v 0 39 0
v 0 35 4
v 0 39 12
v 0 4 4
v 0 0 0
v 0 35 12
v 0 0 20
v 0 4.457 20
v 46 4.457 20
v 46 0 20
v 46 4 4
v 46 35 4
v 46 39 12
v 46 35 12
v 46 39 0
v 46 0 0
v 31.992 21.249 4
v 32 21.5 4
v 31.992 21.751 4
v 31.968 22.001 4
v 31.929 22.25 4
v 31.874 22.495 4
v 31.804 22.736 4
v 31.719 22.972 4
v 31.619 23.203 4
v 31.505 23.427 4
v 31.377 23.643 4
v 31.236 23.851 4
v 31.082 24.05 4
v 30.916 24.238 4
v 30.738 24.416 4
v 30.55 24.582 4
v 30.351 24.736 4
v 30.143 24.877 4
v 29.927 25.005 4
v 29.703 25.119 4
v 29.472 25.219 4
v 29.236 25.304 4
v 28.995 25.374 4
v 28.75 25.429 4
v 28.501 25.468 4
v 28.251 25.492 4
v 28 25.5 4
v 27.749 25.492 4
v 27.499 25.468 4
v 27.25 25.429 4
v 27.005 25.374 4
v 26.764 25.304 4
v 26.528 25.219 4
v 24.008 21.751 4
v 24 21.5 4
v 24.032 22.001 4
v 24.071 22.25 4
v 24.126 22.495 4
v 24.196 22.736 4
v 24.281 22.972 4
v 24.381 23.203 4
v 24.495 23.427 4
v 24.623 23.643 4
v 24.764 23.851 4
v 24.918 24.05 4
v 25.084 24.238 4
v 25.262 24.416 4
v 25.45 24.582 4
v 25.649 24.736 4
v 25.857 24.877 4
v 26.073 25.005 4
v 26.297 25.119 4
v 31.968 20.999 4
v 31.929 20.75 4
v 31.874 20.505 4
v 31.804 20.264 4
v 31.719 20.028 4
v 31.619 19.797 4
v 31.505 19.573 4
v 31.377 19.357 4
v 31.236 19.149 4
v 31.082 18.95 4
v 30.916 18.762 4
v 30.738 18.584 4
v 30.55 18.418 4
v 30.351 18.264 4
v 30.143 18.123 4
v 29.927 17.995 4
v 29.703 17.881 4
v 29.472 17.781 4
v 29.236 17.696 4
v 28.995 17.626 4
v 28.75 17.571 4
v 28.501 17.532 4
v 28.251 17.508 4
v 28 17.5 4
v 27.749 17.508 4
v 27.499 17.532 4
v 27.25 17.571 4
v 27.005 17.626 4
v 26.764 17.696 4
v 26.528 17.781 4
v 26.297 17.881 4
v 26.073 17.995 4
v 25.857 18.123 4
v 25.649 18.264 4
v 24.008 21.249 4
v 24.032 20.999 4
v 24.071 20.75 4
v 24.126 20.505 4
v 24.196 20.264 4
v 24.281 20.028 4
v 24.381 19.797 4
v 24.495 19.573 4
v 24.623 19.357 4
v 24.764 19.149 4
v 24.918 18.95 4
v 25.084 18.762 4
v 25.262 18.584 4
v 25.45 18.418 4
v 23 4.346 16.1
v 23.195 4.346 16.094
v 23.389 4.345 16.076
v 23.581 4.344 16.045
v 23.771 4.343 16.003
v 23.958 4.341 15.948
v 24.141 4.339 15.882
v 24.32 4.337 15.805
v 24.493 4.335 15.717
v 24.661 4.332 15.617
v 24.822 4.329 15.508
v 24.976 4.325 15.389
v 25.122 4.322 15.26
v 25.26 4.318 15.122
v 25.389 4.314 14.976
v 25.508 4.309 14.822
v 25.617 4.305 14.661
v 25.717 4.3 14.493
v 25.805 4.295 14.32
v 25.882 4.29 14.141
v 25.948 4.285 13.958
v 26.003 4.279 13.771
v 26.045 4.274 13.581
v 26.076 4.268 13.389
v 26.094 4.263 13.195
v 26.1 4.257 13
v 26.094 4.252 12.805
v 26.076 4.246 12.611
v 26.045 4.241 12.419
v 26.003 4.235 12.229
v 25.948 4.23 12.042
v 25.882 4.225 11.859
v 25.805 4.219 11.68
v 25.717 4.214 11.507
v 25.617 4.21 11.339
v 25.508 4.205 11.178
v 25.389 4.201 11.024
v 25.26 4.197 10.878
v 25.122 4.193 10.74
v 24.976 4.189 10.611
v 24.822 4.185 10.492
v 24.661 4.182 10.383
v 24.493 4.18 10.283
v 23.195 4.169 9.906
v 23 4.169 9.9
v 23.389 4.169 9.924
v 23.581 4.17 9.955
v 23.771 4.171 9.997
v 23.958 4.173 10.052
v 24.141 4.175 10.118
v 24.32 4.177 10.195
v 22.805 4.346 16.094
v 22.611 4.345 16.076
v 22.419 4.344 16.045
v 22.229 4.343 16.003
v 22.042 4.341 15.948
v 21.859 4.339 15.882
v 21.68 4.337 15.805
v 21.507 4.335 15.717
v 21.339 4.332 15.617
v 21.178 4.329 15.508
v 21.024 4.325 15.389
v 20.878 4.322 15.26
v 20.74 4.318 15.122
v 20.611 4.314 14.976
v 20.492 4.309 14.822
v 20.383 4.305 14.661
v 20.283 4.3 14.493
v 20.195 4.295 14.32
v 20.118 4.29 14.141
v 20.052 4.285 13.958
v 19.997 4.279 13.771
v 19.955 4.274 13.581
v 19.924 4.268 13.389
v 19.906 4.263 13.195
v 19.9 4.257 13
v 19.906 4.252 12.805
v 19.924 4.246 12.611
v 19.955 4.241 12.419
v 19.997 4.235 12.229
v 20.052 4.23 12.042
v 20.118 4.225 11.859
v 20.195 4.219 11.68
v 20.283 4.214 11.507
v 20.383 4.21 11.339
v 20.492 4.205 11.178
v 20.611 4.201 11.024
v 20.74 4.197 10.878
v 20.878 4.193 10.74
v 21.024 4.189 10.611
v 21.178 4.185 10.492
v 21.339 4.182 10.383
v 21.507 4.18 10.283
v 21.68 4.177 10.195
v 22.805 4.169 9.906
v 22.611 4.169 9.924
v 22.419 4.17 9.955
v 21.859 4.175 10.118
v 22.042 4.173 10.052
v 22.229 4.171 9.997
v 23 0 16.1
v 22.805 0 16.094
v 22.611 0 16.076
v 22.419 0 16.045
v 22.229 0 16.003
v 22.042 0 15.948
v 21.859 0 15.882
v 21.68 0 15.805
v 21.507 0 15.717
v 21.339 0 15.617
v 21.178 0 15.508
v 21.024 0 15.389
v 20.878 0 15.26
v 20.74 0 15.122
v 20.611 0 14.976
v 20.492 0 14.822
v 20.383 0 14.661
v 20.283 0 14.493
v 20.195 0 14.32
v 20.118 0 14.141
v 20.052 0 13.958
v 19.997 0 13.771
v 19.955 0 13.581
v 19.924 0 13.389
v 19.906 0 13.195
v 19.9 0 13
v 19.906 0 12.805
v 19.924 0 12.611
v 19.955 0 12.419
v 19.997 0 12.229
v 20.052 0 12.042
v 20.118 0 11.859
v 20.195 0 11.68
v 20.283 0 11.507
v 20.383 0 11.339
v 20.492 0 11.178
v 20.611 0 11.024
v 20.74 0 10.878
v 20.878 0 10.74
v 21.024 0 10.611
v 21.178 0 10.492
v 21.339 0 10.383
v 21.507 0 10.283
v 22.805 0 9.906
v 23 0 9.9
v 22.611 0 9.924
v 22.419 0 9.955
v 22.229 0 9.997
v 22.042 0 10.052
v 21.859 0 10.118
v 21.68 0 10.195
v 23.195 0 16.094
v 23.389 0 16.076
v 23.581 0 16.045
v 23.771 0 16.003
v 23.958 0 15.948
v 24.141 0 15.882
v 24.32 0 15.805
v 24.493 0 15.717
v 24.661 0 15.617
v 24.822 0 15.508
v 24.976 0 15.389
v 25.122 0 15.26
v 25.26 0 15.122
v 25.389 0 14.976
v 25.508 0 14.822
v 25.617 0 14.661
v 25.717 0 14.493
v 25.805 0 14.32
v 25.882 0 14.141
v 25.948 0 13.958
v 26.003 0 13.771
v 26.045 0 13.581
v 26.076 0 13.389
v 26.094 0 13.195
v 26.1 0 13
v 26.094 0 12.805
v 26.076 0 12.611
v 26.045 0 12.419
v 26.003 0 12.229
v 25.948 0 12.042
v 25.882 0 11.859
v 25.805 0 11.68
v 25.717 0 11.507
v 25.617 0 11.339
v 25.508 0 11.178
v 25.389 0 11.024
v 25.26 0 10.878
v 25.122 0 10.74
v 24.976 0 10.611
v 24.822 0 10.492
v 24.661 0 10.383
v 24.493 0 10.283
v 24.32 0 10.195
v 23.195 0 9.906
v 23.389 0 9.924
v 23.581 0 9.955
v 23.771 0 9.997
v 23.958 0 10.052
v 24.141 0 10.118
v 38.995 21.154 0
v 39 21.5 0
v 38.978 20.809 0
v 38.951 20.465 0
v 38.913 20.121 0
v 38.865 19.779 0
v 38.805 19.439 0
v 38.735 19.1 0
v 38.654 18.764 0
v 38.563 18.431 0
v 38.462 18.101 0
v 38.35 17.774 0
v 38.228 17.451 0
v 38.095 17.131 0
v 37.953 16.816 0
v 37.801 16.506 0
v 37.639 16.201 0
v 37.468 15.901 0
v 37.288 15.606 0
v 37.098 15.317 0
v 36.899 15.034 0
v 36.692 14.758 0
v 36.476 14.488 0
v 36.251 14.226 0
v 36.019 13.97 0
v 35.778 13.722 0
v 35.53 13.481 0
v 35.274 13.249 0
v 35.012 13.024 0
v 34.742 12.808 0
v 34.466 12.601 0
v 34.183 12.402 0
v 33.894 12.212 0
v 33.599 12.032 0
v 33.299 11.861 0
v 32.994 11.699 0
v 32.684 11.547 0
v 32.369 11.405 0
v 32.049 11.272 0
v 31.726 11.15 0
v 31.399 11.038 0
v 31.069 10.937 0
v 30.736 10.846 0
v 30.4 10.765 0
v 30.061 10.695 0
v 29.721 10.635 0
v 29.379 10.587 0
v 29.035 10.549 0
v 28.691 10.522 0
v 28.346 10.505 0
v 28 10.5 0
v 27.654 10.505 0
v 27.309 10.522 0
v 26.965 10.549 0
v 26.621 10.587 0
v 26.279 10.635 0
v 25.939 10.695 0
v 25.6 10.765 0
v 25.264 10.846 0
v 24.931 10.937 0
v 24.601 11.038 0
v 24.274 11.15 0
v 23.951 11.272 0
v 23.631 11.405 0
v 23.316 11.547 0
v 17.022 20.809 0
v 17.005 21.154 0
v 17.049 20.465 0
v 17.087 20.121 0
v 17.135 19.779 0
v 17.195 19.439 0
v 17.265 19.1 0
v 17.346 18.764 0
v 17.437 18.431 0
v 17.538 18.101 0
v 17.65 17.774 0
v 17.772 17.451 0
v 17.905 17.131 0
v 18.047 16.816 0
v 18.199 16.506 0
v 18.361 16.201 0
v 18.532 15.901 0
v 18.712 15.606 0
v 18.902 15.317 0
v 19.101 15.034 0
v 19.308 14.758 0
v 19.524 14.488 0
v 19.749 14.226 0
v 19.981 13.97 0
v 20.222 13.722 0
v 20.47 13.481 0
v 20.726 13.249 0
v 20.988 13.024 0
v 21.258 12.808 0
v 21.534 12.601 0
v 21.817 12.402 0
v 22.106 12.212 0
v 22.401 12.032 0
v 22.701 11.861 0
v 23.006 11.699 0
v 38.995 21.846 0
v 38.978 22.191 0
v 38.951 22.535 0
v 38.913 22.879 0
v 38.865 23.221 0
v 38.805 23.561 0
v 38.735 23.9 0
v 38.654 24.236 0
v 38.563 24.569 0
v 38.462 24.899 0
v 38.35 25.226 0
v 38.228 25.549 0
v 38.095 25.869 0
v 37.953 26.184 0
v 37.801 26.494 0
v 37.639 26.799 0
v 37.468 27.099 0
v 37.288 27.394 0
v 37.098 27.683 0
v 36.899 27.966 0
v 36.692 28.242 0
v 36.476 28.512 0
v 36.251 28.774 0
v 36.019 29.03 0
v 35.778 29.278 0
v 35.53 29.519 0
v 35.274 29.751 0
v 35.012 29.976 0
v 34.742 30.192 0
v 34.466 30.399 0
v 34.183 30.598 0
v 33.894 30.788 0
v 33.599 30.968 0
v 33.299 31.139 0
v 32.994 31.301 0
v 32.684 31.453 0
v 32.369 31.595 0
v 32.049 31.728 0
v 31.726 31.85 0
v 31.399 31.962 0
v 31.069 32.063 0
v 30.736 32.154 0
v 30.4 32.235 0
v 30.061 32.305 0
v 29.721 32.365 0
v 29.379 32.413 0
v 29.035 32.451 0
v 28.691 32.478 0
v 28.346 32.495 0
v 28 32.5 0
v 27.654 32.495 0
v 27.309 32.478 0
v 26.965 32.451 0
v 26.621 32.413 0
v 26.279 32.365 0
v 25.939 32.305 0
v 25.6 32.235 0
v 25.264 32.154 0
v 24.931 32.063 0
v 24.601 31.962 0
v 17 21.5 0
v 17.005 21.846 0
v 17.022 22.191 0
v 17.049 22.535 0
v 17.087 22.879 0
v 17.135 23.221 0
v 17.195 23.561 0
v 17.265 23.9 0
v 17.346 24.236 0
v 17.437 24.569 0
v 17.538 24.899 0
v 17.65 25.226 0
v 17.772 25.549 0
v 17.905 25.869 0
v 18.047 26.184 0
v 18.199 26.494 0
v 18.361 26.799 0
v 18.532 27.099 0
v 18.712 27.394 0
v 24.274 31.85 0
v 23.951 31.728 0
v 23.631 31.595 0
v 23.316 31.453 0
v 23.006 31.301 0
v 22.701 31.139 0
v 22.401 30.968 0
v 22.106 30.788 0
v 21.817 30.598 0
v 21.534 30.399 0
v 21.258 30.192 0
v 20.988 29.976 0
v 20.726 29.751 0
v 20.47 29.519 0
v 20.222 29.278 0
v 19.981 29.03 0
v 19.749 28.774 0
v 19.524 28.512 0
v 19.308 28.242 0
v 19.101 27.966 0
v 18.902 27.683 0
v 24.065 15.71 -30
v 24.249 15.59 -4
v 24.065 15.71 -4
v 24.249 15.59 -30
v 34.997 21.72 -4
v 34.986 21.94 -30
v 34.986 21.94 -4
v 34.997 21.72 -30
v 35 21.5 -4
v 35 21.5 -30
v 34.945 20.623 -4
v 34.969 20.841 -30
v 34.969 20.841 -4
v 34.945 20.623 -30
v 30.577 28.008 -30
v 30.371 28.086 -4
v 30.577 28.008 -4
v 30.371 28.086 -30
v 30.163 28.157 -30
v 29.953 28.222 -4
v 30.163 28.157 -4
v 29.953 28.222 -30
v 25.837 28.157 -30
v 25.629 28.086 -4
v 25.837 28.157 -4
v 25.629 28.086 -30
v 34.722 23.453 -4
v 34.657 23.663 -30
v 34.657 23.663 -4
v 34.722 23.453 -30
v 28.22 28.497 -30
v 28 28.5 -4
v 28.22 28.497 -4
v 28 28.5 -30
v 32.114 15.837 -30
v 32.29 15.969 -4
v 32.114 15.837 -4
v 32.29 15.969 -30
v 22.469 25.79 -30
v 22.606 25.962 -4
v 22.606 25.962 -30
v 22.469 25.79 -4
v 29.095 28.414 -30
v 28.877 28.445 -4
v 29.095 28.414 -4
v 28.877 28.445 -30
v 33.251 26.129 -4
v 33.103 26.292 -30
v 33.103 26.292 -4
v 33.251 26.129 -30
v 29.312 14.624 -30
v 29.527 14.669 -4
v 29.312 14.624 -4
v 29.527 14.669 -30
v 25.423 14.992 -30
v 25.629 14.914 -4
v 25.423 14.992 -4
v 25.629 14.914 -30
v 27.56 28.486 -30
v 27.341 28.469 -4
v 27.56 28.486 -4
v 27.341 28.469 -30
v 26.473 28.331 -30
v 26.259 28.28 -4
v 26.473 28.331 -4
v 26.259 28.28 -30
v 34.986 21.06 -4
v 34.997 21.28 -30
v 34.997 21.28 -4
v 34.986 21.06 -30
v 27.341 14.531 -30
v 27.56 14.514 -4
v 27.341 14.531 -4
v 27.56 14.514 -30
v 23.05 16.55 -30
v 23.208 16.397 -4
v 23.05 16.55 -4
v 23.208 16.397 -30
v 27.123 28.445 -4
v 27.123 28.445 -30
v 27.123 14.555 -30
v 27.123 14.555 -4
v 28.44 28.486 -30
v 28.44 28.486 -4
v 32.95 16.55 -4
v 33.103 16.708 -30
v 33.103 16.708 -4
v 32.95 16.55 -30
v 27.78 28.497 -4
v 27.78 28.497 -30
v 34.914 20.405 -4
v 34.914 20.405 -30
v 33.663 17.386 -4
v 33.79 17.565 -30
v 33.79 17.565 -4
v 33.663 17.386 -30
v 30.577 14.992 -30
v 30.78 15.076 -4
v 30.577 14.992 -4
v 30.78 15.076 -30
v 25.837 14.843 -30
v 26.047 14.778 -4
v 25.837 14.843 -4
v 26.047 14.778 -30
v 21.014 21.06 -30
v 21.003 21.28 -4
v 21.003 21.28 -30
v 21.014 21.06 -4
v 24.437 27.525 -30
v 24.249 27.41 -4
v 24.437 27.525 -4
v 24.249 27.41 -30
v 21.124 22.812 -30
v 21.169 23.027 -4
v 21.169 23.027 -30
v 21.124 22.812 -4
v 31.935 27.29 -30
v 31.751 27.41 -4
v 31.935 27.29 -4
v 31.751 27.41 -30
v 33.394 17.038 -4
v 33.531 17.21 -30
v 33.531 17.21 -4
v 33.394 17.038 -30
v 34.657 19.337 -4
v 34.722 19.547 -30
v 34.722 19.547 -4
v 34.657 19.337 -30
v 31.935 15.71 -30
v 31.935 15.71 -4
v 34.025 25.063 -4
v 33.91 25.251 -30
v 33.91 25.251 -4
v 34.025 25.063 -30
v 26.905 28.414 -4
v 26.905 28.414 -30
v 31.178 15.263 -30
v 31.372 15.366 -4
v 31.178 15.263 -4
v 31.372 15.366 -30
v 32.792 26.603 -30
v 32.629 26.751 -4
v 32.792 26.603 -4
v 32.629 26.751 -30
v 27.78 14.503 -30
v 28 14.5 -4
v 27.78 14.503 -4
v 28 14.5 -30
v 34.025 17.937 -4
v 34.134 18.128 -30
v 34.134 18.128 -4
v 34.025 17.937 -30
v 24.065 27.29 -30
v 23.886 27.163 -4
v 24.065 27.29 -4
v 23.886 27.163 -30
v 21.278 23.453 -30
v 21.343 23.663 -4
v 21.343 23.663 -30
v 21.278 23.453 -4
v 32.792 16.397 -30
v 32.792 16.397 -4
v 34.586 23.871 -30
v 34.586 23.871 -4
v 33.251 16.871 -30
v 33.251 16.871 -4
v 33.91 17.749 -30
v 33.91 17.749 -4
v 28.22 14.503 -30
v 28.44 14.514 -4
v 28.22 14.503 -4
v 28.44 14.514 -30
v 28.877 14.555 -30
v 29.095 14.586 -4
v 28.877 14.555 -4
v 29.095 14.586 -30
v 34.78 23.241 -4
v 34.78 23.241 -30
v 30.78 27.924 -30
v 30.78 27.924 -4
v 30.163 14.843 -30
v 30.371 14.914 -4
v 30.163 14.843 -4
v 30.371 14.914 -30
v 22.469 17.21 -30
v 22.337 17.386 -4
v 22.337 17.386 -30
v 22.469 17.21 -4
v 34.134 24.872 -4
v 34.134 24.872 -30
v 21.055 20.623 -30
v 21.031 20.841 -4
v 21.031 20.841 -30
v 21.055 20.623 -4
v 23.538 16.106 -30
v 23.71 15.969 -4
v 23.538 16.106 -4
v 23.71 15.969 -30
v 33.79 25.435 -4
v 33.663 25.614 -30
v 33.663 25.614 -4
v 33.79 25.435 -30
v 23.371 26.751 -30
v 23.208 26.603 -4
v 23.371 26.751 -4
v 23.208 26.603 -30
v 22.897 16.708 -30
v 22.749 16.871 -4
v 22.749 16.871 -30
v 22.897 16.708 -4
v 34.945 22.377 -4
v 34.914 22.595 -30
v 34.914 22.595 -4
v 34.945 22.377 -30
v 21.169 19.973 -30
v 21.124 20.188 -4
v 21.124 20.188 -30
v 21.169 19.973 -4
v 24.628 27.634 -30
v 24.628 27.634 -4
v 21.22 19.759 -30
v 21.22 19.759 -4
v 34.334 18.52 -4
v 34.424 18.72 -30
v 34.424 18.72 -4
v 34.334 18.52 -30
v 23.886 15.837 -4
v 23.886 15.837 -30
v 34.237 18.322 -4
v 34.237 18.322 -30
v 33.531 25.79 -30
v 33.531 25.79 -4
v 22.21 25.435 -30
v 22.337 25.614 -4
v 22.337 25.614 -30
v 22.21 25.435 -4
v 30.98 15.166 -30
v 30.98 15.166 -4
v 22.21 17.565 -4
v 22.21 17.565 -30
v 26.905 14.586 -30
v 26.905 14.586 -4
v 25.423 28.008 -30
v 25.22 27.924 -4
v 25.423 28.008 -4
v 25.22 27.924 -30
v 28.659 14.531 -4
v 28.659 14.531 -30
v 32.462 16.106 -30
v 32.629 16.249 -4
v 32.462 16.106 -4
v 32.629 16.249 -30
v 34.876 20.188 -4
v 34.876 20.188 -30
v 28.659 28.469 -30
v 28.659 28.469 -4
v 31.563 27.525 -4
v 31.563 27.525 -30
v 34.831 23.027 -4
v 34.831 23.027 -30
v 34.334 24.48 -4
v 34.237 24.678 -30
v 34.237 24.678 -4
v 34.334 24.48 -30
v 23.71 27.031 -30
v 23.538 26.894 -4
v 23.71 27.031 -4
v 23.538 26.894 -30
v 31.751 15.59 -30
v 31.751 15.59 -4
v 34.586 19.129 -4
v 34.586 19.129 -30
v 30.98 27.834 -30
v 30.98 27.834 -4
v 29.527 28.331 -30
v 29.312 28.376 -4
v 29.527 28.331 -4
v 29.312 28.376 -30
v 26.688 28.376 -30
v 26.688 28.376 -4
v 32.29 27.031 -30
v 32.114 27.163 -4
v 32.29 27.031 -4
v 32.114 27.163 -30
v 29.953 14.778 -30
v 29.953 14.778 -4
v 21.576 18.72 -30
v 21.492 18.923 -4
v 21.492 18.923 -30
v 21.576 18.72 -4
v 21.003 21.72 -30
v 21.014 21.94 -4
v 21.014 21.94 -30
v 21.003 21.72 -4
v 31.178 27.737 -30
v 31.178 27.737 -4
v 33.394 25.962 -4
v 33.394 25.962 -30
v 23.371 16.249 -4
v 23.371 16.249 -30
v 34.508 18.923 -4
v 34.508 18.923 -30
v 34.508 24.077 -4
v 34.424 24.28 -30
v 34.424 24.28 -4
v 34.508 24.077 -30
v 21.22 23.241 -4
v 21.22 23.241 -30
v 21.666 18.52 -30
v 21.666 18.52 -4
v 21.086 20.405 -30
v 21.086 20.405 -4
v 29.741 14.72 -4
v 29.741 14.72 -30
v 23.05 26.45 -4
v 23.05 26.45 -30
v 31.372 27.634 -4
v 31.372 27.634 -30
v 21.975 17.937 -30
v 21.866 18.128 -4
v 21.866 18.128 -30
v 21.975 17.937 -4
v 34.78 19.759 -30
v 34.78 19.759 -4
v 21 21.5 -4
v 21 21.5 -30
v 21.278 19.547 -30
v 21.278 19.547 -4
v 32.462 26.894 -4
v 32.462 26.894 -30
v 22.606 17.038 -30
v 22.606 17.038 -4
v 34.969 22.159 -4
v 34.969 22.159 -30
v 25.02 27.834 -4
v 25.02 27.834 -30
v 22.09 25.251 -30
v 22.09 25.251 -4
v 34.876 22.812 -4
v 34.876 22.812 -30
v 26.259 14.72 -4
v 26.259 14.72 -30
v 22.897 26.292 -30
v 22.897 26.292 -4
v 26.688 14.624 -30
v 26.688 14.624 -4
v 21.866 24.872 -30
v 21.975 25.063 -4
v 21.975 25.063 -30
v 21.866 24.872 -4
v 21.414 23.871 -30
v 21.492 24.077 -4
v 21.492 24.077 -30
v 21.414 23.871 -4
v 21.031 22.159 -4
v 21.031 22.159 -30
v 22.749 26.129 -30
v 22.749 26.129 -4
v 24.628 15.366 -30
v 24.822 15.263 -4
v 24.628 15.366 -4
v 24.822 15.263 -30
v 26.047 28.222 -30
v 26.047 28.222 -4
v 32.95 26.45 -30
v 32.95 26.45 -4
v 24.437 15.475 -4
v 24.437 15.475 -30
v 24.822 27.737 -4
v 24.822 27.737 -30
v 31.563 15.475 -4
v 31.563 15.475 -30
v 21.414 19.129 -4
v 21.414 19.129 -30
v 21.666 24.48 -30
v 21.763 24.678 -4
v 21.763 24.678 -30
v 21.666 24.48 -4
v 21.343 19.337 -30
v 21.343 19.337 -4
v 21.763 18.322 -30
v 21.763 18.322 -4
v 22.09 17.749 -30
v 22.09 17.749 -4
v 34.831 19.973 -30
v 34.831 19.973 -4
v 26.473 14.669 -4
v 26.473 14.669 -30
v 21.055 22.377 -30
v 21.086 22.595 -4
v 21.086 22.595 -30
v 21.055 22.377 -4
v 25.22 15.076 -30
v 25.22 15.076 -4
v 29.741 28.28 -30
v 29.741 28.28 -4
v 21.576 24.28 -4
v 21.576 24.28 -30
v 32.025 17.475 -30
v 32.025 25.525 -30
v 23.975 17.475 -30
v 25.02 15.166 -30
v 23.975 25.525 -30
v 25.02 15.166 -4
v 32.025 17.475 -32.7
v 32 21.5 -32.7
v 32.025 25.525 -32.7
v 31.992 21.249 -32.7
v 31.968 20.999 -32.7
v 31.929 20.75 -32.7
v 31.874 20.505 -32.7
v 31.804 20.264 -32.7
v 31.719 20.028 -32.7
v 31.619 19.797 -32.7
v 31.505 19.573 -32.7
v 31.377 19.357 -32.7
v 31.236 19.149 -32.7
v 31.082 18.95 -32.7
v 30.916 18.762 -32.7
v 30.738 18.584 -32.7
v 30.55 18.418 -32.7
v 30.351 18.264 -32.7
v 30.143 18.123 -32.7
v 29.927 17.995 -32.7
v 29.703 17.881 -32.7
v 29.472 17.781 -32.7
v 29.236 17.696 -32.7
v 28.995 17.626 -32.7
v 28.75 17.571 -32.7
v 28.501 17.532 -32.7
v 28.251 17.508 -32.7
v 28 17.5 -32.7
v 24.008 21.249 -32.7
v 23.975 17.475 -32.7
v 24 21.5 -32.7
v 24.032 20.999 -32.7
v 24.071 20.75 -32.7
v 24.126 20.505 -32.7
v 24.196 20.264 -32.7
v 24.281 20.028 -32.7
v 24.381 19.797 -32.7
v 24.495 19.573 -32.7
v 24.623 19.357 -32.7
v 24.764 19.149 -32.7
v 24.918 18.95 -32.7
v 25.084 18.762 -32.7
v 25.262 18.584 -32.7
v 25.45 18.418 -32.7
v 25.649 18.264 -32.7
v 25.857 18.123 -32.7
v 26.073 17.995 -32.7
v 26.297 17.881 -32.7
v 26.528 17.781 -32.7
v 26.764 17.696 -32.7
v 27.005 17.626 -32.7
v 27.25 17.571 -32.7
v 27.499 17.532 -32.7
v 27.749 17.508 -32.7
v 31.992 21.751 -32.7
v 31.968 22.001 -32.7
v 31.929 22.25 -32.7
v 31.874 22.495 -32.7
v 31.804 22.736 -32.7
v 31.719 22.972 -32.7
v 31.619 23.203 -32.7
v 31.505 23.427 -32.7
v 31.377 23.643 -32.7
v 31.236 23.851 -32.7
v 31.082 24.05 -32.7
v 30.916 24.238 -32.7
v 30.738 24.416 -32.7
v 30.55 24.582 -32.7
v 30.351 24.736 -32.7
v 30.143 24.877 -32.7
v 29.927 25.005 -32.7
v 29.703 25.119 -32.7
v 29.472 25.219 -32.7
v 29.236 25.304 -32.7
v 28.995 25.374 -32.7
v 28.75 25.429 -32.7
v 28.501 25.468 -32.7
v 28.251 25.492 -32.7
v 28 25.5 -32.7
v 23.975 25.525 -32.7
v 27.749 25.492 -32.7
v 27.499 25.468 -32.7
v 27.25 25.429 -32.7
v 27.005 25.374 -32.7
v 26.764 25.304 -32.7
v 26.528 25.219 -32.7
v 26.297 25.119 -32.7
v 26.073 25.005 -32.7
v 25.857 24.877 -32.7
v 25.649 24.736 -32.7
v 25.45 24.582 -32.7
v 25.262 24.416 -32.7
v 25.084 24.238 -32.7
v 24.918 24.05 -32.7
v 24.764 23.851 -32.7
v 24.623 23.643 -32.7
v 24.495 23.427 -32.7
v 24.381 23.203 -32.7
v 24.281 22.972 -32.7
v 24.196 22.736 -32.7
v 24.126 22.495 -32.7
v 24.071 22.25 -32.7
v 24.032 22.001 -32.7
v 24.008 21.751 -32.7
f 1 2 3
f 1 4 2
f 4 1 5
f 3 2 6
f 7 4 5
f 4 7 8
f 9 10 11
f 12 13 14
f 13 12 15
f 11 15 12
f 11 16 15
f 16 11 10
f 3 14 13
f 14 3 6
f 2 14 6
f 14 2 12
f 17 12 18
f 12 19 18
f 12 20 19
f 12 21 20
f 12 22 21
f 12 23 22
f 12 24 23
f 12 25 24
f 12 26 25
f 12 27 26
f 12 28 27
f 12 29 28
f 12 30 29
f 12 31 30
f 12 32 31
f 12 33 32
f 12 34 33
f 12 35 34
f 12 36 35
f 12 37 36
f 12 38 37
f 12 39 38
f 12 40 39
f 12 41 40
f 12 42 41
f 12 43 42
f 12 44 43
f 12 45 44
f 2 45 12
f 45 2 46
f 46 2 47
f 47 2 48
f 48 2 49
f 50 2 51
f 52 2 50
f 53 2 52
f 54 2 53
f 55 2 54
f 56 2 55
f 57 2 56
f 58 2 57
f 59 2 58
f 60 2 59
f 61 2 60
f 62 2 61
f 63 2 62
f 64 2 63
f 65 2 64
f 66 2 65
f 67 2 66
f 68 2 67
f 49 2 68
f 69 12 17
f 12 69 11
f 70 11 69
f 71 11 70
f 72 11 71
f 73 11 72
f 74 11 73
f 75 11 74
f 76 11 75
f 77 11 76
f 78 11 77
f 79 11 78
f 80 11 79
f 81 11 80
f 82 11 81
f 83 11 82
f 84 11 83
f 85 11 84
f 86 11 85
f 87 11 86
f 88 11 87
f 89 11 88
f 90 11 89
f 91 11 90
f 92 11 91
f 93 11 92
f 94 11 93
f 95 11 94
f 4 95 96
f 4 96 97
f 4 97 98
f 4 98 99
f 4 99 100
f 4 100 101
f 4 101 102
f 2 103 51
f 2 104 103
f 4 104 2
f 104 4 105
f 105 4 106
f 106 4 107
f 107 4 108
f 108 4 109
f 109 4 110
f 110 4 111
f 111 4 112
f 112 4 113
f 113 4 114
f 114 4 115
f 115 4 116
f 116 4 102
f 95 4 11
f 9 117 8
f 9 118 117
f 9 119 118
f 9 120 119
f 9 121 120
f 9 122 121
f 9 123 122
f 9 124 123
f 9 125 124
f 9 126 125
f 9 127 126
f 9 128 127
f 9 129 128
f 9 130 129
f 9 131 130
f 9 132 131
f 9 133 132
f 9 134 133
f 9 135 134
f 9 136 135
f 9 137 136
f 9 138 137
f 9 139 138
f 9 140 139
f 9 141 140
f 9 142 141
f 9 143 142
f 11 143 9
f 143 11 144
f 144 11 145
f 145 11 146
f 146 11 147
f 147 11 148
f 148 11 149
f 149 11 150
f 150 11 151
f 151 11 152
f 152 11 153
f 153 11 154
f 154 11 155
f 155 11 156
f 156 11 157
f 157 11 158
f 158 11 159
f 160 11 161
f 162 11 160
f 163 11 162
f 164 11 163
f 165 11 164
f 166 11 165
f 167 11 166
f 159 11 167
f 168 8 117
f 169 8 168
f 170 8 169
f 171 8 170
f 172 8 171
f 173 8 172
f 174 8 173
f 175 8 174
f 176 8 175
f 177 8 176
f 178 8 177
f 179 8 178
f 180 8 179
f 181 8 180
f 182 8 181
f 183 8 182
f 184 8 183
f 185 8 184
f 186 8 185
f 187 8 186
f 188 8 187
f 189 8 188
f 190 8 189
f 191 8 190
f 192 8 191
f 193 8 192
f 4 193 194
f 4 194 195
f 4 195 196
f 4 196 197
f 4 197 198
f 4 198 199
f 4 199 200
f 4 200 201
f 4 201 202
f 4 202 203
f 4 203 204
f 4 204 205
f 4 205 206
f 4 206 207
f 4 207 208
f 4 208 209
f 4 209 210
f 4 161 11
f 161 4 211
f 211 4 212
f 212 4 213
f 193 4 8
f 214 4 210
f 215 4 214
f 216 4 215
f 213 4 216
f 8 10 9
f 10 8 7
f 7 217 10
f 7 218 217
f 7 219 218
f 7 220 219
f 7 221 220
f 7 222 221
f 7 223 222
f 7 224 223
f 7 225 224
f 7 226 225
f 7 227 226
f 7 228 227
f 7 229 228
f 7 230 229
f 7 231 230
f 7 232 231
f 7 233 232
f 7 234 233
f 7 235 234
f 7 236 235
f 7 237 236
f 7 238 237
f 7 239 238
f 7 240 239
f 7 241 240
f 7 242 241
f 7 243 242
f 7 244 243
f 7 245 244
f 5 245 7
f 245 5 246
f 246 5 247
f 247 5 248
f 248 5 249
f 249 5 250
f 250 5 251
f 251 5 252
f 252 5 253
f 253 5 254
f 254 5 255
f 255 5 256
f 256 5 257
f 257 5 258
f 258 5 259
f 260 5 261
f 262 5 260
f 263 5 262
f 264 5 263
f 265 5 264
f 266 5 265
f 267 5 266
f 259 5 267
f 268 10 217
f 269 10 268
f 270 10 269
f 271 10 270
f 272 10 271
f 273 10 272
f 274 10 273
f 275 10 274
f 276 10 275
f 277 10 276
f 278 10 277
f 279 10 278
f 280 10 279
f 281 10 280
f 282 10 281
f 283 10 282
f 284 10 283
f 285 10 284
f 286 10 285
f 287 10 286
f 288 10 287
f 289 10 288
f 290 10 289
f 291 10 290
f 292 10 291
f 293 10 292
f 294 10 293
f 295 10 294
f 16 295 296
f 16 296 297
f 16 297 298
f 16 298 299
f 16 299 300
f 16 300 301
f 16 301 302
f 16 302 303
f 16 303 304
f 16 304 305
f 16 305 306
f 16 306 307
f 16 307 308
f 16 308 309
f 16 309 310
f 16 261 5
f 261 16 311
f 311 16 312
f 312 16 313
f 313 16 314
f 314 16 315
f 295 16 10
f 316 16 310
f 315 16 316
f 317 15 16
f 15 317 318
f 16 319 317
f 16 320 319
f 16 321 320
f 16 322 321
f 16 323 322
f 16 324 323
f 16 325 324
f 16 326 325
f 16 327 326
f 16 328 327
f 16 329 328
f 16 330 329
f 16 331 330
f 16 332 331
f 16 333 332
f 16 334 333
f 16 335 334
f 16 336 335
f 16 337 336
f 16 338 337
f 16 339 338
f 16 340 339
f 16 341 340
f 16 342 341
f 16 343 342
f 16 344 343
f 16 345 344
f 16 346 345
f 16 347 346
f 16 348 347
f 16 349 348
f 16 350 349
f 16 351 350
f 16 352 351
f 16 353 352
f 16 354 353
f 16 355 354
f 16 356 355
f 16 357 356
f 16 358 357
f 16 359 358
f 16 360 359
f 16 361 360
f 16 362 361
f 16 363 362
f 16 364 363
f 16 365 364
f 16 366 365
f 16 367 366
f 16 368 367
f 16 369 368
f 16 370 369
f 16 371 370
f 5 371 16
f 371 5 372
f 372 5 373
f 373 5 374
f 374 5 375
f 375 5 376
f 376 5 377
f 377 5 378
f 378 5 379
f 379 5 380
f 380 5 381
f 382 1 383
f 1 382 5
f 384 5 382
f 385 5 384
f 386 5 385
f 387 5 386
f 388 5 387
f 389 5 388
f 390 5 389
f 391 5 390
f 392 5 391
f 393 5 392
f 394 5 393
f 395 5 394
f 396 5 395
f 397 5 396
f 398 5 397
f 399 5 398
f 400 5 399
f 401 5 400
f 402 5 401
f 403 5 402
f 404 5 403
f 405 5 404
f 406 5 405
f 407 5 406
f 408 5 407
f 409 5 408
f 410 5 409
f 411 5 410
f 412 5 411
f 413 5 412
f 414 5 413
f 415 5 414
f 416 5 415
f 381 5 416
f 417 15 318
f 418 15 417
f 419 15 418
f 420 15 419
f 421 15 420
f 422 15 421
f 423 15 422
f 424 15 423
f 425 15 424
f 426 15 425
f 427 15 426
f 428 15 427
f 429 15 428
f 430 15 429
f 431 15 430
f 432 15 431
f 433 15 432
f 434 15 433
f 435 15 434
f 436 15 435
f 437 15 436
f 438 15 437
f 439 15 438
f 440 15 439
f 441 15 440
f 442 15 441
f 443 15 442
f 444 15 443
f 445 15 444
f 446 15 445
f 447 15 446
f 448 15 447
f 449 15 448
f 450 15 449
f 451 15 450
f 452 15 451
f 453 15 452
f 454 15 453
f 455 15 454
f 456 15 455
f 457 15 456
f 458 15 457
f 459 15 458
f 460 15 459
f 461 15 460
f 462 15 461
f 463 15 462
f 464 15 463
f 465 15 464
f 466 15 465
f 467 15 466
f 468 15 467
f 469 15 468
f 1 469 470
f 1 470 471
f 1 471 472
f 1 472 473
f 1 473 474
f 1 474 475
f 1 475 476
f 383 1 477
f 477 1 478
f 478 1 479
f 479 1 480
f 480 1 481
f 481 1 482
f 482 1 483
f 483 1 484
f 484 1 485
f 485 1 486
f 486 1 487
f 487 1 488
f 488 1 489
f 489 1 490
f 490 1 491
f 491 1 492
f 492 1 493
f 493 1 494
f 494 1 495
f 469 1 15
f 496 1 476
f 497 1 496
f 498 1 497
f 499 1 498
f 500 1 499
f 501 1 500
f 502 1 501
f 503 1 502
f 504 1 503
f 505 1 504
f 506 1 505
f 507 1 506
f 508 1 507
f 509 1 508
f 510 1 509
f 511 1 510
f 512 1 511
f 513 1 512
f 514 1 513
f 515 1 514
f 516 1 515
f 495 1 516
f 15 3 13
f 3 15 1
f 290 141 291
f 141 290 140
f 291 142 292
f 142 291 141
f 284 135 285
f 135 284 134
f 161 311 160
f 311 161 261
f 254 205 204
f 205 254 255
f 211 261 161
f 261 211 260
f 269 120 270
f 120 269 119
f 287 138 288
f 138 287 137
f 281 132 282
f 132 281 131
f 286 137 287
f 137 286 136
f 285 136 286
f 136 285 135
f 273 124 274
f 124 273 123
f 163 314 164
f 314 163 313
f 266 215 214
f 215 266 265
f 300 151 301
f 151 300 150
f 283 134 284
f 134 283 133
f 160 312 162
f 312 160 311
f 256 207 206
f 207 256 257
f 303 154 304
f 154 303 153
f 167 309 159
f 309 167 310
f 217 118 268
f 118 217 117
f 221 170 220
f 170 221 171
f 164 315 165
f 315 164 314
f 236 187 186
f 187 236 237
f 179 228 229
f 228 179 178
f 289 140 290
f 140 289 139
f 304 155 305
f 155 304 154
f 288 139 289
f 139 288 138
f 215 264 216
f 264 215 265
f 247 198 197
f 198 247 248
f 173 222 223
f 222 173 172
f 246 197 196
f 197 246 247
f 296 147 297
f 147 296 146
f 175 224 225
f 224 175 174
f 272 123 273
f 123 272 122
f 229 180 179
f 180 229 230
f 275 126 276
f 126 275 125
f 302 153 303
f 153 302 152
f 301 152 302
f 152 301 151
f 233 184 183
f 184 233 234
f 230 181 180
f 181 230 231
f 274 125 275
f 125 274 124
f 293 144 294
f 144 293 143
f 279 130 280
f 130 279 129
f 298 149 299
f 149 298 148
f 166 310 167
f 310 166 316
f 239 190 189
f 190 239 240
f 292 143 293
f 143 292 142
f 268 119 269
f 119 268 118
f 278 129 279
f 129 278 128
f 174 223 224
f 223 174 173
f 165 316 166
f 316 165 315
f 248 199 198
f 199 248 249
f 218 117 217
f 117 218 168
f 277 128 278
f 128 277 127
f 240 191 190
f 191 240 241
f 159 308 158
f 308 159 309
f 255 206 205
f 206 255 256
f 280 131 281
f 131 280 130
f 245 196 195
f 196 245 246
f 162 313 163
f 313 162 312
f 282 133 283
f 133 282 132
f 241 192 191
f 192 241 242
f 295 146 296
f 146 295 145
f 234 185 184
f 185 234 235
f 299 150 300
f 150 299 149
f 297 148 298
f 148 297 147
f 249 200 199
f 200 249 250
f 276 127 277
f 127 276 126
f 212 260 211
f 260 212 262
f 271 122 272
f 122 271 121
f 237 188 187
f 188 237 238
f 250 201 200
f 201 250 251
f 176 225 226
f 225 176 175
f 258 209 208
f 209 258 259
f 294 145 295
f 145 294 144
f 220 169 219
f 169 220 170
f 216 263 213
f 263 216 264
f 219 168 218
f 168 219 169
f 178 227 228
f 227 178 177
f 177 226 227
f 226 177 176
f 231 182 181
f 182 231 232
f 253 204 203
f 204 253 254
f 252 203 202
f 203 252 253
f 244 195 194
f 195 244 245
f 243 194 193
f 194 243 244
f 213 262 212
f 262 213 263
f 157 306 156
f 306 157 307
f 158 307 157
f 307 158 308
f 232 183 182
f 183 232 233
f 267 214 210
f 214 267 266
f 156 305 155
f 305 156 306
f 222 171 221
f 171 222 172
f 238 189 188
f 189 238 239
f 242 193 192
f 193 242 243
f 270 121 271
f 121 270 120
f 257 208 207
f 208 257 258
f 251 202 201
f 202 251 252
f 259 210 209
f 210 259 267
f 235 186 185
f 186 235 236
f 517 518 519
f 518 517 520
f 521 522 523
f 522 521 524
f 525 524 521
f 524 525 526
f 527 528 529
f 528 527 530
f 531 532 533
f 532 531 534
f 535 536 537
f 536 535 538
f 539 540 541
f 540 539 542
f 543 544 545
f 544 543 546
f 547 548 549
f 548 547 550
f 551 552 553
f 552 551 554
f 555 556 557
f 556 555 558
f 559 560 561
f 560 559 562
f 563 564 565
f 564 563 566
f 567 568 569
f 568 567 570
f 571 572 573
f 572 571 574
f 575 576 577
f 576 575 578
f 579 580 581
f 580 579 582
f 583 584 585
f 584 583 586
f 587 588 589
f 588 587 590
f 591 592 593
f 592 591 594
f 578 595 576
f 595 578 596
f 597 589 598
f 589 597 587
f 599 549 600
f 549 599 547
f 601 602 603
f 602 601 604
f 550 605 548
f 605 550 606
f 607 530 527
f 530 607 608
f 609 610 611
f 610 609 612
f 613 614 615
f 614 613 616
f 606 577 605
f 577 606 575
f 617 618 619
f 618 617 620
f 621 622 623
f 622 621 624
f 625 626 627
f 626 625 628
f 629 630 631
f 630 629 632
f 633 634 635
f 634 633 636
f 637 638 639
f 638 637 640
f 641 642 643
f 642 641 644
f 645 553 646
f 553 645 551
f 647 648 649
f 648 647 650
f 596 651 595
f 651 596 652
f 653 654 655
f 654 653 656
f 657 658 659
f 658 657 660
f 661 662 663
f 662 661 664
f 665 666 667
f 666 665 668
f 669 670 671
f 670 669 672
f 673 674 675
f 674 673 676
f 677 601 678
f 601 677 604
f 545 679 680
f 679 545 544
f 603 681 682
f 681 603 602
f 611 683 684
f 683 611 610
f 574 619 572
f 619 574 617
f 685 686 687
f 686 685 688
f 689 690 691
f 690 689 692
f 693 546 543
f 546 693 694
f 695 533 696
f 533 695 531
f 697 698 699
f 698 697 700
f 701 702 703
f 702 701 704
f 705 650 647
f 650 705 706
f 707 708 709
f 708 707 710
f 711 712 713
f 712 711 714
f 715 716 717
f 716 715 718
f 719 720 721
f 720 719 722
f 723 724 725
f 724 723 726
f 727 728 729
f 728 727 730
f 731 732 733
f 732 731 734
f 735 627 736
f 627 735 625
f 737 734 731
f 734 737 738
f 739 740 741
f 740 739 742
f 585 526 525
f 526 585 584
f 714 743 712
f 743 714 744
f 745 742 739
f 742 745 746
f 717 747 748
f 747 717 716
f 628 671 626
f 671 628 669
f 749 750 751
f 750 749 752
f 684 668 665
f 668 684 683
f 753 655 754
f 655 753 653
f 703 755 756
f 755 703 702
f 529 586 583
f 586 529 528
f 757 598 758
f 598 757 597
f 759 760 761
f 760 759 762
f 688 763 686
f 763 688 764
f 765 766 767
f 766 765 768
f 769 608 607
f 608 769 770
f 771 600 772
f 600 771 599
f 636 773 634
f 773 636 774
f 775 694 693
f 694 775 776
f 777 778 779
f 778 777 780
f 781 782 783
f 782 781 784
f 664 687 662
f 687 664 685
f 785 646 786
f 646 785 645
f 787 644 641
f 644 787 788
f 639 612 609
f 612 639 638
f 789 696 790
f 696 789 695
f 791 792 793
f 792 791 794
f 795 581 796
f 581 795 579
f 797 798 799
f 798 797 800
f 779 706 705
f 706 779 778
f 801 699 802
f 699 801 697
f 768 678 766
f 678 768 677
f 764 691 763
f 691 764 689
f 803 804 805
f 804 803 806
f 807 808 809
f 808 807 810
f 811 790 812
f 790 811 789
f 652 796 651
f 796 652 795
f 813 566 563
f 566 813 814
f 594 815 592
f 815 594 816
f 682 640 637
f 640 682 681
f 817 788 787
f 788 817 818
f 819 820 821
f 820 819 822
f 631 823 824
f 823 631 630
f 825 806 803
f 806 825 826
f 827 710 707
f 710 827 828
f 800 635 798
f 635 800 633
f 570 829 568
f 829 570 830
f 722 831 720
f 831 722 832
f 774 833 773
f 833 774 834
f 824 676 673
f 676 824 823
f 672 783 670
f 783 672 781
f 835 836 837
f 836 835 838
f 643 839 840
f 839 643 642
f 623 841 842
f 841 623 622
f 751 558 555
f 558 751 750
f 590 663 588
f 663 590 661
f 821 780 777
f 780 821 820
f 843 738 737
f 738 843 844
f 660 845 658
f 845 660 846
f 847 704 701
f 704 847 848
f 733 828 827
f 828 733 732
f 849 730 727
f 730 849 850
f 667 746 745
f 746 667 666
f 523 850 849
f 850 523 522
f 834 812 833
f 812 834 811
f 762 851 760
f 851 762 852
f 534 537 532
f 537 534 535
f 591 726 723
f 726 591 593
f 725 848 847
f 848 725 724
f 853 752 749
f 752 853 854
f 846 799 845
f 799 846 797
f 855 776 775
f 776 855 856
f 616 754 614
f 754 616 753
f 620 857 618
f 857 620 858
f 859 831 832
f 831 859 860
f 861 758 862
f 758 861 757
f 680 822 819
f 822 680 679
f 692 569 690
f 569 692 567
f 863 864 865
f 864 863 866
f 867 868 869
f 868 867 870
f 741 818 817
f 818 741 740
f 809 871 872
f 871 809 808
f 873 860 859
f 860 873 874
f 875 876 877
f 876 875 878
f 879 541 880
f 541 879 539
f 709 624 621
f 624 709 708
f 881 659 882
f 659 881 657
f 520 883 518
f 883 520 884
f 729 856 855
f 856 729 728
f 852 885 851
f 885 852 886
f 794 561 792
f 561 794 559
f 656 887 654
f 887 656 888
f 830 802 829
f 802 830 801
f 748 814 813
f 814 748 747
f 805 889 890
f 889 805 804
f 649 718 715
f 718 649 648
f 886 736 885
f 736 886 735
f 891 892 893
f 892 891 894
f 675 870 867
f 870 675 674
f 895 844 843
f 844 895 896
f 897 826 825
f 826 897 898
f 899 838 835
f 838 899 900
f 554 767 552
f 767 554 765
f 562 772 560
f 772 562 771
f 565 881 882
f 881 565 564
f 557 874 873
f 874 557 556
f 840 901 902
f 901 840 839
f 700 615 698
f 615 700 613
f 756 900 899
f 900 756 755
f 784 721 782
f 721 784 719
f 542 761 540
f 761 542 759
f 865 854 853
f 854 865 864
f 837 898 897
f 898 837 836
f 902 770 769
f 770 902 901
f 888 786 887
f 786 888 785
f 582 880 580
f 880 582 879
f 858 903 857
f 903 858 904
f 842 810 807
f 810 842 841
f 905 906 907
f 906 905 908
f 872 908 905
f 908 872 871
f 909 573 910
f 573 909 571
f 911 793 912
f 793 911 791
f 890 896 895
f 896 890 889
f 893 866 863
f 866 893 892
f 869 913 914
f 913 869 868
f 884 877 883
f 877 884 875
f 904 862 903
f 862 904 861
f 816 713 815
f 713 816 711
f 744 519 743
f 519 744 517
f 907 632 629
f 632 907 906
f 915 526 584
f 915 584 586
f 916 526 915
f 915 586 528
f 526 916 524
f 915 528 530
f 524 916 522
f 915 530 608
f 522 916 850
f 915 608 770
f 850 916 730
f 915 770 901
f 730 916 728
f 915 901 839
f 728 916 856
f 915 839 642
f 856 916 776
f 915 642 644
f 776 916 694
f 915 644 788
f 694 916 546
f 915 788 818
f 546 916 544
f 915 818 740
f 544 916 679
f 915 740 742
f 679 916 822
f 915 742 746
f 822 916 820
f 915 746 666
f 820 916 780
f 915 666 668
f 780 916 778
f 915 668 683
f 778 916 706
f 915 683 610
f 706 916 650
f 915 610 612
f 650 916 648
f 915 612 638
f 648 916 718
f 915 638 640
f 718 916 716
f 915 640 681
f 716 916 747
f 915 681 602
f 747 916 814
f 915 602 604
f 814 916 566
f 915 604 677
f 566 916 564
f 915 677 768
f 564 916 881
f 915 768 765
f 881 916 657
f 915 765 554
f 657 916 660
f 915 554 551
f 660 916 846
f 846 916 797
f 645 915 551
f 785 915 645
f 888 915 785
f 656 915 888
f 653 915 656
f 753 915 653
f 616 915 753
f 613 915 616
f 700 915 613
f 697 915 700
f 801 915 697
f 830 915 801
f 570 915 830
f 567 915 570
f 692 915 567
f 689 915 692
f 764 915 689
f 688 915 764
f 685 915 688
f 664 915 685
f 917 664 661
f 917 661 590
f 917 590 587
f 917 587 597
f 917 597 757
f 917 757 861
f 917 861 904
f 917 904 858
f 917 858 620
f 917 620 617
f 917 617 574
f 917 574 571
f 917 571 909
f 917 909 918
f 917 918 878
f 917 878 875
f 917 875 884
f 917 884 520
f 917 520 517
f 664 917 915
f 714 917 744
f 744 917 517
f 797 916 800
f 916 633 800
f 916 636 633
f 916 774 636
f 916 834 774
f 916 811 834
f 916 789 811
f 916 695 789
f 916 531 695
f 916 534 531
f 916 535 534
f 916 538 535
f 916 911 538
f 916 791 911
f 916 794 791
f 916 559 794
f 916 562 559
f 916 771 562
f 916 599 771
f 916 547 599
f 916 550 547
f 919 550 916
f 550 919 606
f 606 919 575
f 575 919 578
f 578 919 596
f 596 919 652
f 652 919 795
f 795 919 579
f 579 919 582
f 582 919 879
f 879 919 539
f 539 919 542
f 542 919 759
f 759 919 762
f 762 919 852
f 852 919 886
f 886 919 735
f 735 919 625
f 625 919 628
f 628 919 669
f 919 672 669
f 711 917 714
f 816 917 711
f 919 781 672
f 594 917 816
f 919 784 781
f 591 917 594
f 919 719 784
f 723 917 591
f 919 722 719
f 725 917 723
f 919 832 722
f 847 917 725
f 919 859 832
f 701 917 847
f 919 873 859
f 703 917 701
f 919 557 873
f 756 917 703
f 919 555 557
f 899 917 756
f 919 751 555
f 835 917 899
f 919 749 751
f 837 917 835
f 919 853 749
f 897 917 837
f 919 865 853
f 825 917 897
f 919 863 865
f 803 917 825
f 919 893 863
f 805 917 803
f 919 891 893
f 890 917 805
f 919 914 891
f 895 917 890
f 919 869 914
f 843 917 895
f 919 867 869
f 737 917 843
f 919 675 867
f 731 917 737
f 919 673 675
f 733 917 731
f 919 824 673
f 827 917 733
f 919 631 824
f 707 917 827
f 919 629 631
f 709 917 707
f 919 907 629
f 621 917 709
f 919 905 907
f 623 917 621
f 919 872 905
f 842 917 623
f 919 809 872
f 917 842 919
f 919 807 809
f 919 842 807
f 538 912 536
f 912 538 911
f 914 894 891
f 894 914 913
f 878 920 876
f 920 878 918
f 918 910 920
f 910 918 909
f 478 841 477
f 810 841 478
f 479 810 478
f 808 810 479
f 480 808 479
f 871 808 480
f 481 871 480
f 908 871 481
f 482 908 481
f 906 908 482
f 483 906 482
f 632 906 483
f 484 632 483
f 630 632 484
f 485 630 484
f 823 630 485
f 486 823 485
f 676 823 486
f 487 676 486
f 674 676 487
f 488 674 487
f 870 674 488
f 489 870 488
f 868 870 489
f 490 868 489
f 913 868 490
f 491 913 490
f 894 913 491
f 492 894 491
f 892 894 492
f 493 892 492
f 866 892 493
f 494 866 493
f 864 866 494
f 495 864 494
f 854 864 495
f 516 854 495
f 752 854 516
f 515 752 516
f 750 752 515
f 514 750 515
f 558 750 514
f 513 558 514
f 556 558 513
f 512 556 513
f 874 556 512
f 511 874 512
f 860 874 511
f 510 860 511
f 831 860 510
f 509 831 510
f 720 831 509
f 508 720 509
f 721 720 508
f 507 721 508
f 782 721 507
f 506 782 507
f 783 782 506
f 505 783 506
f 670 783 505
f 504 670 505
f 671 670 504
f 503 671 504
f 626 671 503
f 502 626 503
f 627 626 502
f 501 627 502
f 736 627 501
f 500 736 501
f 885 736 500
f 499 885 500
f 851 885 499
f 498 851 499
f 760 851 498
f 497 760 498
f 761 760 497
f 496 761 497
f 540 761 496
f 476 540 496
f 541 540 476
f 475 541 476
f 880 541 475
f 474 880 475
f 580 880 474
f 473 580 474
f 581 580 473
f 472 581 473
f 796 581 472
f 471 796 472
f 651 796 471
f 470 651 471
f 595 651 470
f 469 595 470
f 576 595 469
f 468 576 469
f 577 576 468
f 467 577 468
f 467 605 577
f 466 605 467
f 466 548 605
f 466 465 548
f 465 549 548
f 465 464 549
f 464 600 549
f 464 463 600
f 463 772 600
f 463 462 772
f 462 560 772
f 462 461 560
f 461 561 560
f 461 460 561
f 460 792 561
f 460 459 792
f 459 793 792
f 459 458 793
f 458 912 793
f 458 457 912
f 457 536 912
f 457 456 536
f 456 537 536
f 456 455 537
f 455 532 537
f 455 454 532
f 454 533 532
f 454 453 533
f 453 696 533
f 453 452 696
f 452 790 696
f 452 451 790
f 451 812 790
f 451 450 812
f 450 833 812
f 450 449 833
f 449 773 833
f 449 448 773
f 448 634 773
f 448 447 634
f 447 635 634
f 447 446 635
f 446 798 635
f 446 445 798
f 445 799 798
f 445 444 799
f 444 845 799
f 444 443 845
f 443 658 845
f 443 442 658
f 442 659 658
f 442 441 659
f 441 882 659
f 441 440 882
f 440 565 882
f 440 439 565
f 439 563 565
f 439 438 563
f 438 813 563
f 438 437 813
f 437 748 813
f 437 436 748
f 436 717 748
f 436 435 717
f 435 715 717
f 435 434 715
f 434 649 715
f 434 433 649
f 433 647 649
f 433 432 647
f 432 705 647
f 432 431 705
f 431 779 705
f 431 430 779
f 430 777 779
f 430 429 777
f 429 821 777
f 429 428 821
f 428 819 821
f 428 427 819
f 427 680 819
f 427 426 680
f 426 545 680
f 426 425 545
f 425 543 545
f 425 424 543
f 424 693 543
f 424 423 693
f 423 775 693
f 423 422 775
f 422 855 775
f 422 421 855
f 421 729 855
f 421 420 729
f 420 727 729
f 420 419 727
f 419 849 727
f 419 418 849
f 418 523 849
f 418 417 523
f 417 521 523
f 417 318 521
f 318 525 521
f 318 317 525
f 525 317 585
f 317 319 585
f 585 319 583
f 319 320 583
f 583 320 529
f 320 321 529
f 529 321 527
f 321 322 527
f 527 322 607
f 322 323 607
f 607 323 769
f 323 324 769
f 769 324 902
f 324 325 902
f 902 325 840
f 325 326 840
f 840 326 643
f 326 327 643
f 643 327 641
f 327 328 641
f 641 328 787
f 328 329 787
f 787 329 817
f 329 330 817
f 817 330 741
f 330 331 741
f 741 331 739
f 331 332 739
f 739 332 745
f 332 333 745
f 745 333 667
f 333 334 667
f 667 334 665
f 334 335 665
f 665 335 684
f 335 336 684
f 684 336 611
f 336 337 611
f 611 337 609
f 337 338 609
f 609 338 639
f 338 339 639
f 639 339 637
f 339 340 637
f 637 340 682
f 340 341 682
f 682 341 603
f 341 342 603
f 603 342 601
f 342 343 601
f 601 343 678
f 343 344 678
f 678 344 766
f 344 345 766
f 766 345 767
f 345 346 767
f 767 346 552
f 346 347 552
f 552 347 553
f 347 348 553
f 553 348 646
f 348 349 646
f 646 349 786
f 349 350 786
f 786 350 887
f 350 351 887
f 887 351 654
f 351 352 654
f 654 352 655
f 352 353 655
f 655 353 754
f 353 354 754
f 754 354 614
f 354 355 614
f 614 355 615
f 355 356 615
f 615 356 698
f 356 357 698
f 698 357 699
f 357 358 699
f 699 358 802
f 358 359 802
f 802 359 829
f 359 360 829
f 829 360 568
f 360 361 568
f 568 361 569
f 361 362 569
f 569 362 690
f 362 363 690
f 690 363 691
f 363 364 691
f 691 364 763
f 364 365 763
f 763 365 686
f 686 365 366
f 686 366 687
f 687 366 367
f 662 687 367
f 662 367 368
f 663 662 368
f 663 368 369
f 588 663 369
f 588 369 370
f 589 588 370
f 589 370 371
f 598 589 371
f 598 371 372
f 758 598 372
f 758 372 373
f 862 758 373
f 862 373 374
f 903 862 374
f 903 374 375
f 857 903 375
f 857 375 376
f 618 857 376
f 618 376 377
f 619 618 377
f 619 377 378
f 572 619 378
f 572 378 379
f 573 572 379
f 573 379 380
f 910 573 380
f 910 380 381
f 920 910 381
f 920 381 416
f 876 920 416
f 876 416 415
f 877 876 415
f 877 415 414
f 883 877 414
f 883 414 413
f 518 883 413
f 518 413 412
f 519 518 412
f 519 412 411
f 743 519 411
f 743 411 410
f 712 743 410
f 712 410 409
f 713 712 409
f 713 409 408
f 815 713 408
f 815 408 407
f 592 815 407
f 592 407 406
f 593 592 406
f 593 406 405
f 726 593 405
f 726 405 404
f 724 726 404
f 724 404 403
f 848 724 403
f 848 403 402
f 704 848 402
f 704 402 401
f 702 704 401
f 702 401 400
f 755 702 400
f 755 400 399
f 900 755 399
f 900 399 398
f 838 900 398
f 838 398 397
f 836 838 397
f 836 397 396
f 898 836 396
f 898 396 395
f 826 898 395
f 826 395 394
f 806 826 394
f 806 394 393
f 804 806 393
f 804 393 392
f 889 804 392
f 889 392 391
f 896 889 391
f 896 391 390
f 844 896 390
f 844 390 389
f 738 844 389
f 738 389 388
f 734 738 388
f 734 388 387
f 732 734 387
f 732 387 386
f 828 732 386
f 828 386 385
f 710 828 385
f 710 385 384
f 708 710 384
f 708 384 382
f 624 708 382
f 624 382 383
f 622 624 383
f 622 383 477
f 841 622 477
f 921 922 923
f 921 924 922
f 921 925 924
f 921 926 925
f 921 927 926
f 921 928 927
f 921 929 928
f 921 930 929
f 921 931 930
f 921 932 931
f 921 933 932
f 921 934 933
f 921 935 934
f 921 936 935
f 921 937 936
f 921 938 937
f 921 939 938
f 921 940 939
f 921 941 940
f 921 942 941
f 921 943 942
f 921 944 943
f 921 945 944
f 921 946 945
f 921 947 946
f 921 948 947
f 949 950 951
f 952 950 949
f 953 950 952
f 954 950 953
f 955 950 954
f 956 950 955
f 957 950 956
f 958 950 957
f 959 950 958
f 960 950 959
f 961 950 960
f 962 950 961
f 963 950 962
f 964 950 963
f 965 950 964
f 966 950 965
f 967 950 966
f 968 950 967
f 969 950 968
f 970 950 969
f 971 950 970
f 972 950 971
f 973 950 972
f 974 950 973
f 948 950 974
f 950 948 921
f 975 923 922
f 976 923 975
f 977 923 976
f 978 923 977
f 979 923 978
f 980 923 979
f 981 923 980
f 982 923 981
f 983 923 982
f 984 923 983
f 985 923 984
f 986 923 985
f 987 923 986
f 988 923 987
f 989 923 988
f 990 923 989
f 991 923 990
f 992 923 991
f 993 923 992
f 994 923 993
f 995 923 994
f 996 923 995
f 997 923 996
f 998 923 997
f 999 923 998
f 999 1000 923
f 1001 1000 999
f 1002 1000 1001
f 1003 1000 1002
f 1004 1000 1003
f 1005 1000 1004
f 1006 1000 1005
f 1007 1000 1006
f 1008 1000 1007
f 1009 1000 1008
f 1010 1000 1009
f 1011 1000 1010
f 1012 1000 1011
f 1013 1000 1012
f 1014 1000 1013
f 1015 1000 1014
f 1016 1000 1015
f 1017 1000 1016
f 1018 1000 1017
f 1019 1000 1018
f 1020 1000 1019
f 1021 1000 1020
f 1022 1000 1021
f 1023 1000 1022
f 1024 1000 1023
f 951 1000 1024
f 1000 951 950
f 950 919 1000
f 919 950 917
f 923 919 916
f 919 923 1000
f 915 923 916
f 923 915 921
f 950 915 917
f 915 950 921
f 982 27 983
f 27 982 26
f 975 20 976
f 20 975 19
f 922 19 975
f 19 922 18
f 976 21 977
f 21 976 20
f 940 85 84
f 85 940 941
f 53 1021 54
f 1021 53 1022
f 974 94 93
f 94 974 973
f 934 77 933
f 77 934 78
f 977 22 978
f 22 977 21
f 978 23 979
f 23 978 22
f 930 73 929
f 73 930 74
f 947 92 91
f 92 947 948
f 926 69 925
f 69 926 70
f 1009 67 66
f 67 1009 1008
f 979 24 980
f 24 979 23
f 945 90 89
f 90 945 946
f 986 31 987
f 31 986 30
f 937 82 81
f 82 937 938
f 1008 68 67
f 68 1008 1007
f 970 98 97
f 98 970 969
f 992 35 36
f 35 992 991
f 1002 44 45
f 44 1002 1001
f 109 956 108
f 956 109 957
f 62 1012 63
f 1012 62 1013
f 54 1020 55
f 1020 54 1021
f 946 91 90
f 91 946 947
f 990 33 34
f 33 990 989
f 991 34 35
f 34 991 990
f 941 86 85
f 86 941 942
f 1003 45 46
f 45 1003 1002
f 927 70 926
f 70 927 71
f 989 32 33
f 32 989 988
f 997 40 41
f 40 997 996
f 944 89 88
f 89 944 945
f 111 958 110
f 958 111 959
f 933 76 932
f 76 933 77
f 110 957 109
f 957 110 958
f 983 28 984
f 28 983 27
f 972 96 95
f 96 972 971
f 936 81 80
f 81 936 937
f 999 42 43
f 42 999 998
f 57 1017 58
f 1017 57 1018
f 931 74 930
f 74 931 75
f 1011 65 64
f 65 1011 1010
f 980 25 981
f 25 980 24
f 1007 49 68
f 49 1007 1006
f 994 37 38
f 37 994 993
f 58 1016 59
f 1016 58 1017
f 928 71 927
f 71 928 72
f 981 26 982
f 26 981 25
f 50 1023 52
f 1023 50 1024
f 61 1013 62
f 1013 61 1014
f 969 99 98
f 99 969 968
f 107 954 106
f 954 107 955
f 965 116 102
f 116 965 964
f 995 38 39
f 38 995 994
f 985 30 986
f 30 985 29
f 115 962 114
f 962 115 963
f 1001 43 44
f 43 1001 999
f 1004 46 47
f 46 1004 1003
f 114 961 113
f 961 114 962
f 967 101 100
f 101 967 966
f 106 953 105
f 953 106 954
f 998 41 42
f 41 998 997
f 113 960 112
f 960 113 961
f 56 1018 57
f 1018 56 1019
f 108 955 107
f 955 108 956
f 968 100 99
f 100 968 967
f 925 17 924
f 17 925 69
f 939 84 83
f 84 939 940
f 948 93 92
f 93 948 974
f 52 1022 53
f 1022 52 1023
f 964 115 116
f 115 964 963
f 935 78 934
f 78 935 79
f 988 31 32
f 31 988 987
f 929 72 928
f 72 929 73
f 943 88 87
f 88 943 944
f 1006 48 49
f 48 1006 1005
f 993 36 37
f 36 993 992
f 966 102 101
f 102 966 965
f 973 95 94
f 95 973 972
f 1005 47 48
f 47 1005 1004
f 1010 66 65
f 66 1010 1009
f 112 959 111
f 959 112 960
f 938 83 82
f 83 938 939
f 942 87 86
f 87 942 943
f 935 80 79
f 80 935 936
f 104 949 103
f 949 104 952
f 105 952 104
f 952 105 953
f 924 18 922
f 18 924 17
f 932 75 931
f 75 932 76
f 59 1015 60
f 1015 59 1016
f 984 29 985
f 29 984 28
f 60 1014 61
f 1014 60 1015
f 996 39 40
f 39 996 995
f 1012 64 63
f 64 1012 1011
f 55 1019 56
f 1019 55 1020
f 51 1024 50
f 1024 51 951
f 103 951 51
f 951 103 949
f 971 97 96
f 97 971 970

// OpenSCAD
/// DistoX2 calibration handle v.2. by Mykyta Kozlov

sn=100; // subdivision for cylinders

module key() {
  linear_extrude(height = 3, center = false, convexity = 10, twist = 0)
  square(8.05,true);
}

difference() {
  union() {
    difference() {
      // handle U-shape
      rotate([90,0,90])
      linear_extrude(height = 46, center = false, convexity = 10, twist = 0)
      polygon([[0,0],[0,20],[4.457143,20],[4,4],[35,4],[35,12],[39,12],[39,0]]);
      // hole for leica fix
      translate([23, 0, 13]) rotate([90, 0, 0]) 
      cylinder(h=9, d1=6.2, d2=6.2, center=true, $fn=sn);
    }
    // handle shaft
    translate([28, 21.5, -30]) cylinder(h=30, d1=14, d2=14, $fn=2*sn);
    // champher between U-shape and shaft
    translate([28, 21.5, 0])
    {
      rotate_extrude(angle = 360, convexity = 10, $fn = 2*sn)
      translate([7,0,0]) polygon([[0,0],[0,-4],[4,0]]);
    }
    // key to fix rotation step
    translate([28, 21.5, -32.7]) key();
  }
  // Hole for 8mm main aluminium shaft
  translate([28, 21.5, -33])
  cylinder(h=40, d1=8, d2=8, $fn=sn);
}
